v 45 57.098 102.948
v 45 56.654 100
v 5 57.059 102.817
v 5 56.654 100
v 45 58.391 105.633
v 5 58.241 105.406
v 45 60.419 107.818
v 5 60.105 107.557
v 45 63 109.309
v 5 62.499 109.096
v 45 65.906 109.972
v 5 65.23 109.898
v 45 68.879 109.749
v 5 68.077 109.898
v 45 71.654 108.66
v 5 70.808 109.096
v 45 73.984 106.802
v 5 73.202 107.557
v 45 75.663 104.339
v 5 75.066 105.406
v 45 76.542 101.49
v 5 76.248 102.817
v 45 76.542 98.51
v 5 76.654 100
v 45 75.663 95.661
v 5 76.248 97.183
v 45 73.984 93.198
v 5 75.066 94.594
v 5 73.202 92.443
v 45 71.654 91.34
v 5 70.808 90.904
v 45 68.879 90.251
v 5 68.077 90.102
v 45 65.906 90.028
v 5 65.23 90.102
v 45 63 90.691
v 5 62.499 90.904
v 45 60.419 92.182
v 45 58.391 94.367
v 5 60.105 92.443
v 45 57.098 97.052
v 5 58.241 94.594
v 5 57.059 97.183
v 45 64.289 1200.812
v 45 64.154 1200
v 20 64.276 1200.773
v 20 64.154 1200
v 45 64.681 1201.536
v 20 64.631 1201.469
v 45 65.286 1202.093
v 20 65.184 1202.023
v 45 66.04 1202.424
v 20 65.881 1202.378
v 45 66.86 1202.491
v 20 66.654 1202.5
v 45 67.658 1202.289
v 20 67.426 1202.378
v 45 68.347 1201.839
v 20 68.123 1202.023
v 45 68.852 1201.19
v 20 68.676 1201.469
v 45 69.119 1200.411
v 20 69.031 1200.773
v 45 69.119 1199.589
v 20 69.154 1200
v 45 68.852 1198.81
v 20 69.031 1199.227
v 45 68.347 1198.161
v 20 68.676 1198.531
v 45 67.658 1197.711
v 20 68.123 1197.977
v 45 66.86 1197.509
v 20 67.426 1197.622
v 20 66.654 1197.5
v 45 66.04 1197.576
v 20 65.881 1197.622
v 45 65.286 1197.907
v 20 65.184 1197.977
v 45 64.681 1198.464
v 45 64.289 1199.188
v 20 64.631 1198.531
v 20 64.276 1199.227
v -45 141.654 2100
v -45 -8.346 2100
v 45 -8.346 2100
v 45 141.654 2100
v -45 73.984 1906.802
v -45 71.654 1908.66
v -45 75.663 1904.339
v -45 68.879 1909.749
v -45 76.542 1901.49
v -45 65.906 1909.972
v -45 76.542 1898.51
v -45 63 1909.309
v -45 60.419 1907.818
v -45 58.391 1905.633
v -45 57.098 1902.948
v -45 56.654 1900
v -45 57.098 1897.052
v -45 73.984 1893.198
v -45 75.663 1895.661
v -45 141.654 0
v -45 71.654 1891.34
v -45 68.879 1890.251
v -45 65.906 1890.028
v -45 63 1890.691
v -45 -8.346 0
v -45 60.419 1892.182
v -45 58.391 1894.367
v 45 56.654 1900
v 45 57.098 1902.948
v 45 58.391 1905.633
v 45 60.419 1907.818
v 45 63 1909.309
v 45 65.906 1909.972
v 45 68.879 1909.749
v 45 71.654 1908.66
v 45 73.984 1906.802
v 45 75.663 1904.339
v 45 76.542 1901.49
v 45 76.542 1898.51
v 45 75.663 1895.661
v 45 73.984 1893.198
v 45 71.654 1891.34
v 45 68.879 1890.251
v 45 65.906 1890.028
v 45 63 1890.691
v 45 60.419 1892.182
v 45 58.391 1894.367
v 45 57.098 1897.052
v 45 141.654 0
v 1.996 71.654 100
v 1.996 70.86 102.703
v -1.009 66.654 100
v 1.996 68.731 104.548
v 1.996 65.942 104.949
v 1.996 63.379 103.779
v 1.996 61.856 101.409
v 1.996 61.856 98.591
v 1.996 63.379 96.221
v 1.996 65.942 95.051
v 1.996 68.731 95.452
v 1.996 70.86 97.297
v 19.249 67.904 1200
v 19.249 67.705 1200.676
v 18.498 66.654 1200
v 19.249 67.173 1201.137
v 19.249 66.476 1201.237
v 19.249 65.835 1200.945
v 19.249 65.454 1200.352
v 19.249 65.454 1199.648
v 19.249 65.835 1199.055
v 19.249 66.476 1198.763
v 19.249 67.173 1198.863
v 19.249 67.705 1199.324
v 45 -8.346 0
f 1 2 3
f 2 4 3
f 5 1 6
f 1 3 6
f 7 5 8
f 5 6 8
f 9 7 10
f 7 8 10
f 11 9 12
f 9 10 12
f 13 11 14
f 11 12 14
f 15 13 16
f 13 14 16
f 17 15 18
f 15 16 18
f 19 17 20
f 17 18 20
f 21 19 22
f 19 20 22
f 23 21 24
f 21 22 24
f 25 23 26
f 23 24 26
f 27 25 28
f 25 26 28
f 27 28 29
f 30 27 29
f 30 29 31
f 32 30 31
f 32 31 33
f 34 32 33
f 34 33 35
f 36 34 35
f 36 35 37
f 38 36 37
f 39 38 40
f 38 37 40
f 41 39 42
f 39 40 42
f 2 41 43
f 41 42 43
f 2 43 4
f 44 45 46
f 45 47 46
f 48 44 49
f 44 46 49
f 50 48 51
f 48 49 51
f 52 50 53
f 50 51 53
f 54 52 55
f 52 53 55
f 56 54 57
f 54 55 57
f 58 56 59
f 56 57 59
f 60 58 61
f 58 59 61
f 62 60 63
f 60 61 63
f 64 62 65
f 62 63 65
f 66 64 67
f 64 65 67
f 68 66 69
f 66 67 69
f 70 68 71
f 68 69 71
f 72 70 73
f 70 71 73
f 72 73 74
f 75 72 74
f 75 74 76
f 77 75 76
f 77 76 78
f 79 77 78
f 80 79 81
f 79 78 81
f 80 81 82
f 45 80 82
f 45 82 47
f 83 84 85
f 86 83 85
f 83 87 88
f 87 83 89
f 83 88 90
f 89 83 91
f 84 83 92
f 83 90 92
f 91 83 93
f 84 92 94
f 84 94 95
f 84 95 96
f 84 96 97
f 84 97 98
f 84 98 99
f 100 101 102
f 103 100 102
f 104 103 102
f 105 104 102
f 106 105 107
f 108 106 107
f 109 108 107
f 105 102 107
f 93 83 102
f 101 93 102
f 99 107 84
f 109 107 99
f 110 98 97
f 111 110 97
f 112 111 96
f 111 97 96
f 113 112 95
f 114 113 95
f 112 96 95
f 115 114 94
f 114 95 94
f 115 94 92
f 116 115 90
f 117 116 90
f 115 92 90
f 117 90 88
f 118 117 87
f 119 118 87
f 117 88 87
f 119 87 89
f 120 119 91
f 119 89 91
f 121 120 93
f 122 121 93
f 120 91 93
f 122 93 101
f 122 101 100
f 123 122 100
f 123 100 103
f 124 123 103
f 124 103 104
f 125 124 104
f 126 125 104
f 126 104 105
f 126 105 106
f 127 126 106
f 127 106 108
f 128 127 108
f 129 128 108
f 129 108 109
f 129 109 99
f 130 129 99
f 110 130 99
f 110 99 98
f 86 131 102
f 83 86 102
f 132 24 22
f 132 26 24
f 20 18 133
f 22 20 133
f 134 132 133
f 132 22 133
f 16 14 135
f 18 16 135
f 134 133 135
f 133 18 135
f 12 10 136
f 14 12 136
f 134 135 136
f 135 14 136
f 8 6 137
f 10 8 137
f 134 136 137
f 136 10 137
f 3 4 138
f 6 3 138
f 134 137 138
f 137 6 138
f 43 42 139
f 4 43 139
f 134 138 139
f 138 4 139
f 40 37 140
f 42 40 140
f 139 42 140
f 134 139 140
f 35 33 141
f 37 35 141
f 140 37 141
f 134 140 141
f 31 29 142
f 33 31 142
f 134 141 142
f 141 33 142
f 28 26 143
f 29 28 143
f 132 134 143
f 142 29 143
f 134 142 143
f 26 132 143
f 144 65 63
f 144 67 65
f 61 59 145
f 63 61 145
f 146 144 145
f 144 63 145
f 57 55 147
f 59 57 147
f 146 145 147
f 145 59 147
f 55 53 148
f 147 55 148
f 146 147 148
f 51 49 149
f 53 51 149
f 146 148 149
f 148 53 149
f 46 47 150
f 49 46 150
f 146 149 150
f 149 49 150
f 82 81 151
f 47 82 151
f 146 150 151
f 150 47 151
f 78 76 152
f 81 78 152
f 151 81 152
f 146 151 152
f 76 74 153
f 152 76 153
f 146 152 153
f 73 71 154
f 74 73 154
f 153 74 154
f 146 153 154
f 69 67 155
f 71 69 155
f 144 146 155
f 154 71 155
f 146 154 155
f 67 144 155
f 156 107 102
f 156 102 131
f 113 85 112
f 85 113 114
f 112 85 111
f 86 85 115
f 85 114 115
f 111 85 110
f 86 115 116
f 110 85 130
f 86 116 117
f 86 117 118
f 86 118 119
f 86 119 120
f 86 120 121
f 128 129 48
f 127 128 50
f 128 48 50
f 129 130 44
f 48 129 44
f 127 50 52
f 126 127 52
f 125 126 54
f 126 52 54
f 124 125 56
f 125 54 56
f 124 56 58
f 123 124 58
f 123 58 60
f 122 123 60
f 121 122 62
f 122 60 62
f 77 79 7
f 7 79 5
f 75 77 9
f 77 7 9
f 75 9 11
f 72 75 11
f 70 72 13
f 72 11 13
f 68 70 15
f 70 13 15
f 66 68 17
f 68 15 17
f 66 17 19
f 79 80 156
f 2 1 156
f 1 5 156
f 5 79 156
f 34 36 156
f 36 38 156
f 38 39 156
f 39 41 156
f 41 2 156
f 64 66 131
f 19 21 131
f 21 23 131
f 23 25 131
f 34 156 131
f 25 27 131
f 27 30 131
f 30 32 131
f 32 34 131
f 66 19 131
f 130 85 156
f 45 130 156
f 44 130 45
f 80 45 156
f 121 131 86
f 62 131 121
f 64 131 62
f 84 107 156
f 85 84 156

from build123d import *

# Parameters (mm, degrees)
F1_DEPTH = 2100
F3_D     = 20
F5_D     = 20
F5_DEPTH = 40
F5_TIP   = 6.0086061903
F6_D     = 5
F6_DEPTH = 25
F6_TIP   = 1.5021515476


with BuildPart() as f1:
    # F0 (on Top) → F1 (new body)
    with BuildSketch(Plane.XY):
        Polygon((-34.2555230263, 141.6535690603), (-45, 141.6535690603), (-45, -8.3464309397), (45, -8.3464309397), (45, 141.6535690603), (34.2555230263, 141.6535690603), align=None)
    extrude(amount=F1_DEPTH)

    # F3 (through all)
    with Locations(Plane.YZ.offset(45)):
        with Locations((66.6535690603, 1900)):
            Hole(F3_D / 2)

    # F5
    with Locations(Plane.YZ.offset(45)):
        with Locations((66.6535690603, 100)):
            Hole(F5_D / 2, depth=F5_DEPTH)
            with Locations((0, 0, -(F5_DEPTH + F5_TIP / 2))):  # 118° drill point
                Cone(0, F5_D / 2, F5_TIP, mode=Mode.SUBTRACT)

    # F6
    with Locations(Plane.YZ.offset(45)):
        with Locations((66.6535690603, 1200)):
            Hole(F6_D / 2, depth=F6_DEPTH)
            with Locations((0, 0, -(F6_DEPTH + F6_TIP / 2))):  # 118° drill point
                Cone(0, F6_D / 2, F6_TIP, mode=Mode.SUBTRACT)


solid = f1.part
